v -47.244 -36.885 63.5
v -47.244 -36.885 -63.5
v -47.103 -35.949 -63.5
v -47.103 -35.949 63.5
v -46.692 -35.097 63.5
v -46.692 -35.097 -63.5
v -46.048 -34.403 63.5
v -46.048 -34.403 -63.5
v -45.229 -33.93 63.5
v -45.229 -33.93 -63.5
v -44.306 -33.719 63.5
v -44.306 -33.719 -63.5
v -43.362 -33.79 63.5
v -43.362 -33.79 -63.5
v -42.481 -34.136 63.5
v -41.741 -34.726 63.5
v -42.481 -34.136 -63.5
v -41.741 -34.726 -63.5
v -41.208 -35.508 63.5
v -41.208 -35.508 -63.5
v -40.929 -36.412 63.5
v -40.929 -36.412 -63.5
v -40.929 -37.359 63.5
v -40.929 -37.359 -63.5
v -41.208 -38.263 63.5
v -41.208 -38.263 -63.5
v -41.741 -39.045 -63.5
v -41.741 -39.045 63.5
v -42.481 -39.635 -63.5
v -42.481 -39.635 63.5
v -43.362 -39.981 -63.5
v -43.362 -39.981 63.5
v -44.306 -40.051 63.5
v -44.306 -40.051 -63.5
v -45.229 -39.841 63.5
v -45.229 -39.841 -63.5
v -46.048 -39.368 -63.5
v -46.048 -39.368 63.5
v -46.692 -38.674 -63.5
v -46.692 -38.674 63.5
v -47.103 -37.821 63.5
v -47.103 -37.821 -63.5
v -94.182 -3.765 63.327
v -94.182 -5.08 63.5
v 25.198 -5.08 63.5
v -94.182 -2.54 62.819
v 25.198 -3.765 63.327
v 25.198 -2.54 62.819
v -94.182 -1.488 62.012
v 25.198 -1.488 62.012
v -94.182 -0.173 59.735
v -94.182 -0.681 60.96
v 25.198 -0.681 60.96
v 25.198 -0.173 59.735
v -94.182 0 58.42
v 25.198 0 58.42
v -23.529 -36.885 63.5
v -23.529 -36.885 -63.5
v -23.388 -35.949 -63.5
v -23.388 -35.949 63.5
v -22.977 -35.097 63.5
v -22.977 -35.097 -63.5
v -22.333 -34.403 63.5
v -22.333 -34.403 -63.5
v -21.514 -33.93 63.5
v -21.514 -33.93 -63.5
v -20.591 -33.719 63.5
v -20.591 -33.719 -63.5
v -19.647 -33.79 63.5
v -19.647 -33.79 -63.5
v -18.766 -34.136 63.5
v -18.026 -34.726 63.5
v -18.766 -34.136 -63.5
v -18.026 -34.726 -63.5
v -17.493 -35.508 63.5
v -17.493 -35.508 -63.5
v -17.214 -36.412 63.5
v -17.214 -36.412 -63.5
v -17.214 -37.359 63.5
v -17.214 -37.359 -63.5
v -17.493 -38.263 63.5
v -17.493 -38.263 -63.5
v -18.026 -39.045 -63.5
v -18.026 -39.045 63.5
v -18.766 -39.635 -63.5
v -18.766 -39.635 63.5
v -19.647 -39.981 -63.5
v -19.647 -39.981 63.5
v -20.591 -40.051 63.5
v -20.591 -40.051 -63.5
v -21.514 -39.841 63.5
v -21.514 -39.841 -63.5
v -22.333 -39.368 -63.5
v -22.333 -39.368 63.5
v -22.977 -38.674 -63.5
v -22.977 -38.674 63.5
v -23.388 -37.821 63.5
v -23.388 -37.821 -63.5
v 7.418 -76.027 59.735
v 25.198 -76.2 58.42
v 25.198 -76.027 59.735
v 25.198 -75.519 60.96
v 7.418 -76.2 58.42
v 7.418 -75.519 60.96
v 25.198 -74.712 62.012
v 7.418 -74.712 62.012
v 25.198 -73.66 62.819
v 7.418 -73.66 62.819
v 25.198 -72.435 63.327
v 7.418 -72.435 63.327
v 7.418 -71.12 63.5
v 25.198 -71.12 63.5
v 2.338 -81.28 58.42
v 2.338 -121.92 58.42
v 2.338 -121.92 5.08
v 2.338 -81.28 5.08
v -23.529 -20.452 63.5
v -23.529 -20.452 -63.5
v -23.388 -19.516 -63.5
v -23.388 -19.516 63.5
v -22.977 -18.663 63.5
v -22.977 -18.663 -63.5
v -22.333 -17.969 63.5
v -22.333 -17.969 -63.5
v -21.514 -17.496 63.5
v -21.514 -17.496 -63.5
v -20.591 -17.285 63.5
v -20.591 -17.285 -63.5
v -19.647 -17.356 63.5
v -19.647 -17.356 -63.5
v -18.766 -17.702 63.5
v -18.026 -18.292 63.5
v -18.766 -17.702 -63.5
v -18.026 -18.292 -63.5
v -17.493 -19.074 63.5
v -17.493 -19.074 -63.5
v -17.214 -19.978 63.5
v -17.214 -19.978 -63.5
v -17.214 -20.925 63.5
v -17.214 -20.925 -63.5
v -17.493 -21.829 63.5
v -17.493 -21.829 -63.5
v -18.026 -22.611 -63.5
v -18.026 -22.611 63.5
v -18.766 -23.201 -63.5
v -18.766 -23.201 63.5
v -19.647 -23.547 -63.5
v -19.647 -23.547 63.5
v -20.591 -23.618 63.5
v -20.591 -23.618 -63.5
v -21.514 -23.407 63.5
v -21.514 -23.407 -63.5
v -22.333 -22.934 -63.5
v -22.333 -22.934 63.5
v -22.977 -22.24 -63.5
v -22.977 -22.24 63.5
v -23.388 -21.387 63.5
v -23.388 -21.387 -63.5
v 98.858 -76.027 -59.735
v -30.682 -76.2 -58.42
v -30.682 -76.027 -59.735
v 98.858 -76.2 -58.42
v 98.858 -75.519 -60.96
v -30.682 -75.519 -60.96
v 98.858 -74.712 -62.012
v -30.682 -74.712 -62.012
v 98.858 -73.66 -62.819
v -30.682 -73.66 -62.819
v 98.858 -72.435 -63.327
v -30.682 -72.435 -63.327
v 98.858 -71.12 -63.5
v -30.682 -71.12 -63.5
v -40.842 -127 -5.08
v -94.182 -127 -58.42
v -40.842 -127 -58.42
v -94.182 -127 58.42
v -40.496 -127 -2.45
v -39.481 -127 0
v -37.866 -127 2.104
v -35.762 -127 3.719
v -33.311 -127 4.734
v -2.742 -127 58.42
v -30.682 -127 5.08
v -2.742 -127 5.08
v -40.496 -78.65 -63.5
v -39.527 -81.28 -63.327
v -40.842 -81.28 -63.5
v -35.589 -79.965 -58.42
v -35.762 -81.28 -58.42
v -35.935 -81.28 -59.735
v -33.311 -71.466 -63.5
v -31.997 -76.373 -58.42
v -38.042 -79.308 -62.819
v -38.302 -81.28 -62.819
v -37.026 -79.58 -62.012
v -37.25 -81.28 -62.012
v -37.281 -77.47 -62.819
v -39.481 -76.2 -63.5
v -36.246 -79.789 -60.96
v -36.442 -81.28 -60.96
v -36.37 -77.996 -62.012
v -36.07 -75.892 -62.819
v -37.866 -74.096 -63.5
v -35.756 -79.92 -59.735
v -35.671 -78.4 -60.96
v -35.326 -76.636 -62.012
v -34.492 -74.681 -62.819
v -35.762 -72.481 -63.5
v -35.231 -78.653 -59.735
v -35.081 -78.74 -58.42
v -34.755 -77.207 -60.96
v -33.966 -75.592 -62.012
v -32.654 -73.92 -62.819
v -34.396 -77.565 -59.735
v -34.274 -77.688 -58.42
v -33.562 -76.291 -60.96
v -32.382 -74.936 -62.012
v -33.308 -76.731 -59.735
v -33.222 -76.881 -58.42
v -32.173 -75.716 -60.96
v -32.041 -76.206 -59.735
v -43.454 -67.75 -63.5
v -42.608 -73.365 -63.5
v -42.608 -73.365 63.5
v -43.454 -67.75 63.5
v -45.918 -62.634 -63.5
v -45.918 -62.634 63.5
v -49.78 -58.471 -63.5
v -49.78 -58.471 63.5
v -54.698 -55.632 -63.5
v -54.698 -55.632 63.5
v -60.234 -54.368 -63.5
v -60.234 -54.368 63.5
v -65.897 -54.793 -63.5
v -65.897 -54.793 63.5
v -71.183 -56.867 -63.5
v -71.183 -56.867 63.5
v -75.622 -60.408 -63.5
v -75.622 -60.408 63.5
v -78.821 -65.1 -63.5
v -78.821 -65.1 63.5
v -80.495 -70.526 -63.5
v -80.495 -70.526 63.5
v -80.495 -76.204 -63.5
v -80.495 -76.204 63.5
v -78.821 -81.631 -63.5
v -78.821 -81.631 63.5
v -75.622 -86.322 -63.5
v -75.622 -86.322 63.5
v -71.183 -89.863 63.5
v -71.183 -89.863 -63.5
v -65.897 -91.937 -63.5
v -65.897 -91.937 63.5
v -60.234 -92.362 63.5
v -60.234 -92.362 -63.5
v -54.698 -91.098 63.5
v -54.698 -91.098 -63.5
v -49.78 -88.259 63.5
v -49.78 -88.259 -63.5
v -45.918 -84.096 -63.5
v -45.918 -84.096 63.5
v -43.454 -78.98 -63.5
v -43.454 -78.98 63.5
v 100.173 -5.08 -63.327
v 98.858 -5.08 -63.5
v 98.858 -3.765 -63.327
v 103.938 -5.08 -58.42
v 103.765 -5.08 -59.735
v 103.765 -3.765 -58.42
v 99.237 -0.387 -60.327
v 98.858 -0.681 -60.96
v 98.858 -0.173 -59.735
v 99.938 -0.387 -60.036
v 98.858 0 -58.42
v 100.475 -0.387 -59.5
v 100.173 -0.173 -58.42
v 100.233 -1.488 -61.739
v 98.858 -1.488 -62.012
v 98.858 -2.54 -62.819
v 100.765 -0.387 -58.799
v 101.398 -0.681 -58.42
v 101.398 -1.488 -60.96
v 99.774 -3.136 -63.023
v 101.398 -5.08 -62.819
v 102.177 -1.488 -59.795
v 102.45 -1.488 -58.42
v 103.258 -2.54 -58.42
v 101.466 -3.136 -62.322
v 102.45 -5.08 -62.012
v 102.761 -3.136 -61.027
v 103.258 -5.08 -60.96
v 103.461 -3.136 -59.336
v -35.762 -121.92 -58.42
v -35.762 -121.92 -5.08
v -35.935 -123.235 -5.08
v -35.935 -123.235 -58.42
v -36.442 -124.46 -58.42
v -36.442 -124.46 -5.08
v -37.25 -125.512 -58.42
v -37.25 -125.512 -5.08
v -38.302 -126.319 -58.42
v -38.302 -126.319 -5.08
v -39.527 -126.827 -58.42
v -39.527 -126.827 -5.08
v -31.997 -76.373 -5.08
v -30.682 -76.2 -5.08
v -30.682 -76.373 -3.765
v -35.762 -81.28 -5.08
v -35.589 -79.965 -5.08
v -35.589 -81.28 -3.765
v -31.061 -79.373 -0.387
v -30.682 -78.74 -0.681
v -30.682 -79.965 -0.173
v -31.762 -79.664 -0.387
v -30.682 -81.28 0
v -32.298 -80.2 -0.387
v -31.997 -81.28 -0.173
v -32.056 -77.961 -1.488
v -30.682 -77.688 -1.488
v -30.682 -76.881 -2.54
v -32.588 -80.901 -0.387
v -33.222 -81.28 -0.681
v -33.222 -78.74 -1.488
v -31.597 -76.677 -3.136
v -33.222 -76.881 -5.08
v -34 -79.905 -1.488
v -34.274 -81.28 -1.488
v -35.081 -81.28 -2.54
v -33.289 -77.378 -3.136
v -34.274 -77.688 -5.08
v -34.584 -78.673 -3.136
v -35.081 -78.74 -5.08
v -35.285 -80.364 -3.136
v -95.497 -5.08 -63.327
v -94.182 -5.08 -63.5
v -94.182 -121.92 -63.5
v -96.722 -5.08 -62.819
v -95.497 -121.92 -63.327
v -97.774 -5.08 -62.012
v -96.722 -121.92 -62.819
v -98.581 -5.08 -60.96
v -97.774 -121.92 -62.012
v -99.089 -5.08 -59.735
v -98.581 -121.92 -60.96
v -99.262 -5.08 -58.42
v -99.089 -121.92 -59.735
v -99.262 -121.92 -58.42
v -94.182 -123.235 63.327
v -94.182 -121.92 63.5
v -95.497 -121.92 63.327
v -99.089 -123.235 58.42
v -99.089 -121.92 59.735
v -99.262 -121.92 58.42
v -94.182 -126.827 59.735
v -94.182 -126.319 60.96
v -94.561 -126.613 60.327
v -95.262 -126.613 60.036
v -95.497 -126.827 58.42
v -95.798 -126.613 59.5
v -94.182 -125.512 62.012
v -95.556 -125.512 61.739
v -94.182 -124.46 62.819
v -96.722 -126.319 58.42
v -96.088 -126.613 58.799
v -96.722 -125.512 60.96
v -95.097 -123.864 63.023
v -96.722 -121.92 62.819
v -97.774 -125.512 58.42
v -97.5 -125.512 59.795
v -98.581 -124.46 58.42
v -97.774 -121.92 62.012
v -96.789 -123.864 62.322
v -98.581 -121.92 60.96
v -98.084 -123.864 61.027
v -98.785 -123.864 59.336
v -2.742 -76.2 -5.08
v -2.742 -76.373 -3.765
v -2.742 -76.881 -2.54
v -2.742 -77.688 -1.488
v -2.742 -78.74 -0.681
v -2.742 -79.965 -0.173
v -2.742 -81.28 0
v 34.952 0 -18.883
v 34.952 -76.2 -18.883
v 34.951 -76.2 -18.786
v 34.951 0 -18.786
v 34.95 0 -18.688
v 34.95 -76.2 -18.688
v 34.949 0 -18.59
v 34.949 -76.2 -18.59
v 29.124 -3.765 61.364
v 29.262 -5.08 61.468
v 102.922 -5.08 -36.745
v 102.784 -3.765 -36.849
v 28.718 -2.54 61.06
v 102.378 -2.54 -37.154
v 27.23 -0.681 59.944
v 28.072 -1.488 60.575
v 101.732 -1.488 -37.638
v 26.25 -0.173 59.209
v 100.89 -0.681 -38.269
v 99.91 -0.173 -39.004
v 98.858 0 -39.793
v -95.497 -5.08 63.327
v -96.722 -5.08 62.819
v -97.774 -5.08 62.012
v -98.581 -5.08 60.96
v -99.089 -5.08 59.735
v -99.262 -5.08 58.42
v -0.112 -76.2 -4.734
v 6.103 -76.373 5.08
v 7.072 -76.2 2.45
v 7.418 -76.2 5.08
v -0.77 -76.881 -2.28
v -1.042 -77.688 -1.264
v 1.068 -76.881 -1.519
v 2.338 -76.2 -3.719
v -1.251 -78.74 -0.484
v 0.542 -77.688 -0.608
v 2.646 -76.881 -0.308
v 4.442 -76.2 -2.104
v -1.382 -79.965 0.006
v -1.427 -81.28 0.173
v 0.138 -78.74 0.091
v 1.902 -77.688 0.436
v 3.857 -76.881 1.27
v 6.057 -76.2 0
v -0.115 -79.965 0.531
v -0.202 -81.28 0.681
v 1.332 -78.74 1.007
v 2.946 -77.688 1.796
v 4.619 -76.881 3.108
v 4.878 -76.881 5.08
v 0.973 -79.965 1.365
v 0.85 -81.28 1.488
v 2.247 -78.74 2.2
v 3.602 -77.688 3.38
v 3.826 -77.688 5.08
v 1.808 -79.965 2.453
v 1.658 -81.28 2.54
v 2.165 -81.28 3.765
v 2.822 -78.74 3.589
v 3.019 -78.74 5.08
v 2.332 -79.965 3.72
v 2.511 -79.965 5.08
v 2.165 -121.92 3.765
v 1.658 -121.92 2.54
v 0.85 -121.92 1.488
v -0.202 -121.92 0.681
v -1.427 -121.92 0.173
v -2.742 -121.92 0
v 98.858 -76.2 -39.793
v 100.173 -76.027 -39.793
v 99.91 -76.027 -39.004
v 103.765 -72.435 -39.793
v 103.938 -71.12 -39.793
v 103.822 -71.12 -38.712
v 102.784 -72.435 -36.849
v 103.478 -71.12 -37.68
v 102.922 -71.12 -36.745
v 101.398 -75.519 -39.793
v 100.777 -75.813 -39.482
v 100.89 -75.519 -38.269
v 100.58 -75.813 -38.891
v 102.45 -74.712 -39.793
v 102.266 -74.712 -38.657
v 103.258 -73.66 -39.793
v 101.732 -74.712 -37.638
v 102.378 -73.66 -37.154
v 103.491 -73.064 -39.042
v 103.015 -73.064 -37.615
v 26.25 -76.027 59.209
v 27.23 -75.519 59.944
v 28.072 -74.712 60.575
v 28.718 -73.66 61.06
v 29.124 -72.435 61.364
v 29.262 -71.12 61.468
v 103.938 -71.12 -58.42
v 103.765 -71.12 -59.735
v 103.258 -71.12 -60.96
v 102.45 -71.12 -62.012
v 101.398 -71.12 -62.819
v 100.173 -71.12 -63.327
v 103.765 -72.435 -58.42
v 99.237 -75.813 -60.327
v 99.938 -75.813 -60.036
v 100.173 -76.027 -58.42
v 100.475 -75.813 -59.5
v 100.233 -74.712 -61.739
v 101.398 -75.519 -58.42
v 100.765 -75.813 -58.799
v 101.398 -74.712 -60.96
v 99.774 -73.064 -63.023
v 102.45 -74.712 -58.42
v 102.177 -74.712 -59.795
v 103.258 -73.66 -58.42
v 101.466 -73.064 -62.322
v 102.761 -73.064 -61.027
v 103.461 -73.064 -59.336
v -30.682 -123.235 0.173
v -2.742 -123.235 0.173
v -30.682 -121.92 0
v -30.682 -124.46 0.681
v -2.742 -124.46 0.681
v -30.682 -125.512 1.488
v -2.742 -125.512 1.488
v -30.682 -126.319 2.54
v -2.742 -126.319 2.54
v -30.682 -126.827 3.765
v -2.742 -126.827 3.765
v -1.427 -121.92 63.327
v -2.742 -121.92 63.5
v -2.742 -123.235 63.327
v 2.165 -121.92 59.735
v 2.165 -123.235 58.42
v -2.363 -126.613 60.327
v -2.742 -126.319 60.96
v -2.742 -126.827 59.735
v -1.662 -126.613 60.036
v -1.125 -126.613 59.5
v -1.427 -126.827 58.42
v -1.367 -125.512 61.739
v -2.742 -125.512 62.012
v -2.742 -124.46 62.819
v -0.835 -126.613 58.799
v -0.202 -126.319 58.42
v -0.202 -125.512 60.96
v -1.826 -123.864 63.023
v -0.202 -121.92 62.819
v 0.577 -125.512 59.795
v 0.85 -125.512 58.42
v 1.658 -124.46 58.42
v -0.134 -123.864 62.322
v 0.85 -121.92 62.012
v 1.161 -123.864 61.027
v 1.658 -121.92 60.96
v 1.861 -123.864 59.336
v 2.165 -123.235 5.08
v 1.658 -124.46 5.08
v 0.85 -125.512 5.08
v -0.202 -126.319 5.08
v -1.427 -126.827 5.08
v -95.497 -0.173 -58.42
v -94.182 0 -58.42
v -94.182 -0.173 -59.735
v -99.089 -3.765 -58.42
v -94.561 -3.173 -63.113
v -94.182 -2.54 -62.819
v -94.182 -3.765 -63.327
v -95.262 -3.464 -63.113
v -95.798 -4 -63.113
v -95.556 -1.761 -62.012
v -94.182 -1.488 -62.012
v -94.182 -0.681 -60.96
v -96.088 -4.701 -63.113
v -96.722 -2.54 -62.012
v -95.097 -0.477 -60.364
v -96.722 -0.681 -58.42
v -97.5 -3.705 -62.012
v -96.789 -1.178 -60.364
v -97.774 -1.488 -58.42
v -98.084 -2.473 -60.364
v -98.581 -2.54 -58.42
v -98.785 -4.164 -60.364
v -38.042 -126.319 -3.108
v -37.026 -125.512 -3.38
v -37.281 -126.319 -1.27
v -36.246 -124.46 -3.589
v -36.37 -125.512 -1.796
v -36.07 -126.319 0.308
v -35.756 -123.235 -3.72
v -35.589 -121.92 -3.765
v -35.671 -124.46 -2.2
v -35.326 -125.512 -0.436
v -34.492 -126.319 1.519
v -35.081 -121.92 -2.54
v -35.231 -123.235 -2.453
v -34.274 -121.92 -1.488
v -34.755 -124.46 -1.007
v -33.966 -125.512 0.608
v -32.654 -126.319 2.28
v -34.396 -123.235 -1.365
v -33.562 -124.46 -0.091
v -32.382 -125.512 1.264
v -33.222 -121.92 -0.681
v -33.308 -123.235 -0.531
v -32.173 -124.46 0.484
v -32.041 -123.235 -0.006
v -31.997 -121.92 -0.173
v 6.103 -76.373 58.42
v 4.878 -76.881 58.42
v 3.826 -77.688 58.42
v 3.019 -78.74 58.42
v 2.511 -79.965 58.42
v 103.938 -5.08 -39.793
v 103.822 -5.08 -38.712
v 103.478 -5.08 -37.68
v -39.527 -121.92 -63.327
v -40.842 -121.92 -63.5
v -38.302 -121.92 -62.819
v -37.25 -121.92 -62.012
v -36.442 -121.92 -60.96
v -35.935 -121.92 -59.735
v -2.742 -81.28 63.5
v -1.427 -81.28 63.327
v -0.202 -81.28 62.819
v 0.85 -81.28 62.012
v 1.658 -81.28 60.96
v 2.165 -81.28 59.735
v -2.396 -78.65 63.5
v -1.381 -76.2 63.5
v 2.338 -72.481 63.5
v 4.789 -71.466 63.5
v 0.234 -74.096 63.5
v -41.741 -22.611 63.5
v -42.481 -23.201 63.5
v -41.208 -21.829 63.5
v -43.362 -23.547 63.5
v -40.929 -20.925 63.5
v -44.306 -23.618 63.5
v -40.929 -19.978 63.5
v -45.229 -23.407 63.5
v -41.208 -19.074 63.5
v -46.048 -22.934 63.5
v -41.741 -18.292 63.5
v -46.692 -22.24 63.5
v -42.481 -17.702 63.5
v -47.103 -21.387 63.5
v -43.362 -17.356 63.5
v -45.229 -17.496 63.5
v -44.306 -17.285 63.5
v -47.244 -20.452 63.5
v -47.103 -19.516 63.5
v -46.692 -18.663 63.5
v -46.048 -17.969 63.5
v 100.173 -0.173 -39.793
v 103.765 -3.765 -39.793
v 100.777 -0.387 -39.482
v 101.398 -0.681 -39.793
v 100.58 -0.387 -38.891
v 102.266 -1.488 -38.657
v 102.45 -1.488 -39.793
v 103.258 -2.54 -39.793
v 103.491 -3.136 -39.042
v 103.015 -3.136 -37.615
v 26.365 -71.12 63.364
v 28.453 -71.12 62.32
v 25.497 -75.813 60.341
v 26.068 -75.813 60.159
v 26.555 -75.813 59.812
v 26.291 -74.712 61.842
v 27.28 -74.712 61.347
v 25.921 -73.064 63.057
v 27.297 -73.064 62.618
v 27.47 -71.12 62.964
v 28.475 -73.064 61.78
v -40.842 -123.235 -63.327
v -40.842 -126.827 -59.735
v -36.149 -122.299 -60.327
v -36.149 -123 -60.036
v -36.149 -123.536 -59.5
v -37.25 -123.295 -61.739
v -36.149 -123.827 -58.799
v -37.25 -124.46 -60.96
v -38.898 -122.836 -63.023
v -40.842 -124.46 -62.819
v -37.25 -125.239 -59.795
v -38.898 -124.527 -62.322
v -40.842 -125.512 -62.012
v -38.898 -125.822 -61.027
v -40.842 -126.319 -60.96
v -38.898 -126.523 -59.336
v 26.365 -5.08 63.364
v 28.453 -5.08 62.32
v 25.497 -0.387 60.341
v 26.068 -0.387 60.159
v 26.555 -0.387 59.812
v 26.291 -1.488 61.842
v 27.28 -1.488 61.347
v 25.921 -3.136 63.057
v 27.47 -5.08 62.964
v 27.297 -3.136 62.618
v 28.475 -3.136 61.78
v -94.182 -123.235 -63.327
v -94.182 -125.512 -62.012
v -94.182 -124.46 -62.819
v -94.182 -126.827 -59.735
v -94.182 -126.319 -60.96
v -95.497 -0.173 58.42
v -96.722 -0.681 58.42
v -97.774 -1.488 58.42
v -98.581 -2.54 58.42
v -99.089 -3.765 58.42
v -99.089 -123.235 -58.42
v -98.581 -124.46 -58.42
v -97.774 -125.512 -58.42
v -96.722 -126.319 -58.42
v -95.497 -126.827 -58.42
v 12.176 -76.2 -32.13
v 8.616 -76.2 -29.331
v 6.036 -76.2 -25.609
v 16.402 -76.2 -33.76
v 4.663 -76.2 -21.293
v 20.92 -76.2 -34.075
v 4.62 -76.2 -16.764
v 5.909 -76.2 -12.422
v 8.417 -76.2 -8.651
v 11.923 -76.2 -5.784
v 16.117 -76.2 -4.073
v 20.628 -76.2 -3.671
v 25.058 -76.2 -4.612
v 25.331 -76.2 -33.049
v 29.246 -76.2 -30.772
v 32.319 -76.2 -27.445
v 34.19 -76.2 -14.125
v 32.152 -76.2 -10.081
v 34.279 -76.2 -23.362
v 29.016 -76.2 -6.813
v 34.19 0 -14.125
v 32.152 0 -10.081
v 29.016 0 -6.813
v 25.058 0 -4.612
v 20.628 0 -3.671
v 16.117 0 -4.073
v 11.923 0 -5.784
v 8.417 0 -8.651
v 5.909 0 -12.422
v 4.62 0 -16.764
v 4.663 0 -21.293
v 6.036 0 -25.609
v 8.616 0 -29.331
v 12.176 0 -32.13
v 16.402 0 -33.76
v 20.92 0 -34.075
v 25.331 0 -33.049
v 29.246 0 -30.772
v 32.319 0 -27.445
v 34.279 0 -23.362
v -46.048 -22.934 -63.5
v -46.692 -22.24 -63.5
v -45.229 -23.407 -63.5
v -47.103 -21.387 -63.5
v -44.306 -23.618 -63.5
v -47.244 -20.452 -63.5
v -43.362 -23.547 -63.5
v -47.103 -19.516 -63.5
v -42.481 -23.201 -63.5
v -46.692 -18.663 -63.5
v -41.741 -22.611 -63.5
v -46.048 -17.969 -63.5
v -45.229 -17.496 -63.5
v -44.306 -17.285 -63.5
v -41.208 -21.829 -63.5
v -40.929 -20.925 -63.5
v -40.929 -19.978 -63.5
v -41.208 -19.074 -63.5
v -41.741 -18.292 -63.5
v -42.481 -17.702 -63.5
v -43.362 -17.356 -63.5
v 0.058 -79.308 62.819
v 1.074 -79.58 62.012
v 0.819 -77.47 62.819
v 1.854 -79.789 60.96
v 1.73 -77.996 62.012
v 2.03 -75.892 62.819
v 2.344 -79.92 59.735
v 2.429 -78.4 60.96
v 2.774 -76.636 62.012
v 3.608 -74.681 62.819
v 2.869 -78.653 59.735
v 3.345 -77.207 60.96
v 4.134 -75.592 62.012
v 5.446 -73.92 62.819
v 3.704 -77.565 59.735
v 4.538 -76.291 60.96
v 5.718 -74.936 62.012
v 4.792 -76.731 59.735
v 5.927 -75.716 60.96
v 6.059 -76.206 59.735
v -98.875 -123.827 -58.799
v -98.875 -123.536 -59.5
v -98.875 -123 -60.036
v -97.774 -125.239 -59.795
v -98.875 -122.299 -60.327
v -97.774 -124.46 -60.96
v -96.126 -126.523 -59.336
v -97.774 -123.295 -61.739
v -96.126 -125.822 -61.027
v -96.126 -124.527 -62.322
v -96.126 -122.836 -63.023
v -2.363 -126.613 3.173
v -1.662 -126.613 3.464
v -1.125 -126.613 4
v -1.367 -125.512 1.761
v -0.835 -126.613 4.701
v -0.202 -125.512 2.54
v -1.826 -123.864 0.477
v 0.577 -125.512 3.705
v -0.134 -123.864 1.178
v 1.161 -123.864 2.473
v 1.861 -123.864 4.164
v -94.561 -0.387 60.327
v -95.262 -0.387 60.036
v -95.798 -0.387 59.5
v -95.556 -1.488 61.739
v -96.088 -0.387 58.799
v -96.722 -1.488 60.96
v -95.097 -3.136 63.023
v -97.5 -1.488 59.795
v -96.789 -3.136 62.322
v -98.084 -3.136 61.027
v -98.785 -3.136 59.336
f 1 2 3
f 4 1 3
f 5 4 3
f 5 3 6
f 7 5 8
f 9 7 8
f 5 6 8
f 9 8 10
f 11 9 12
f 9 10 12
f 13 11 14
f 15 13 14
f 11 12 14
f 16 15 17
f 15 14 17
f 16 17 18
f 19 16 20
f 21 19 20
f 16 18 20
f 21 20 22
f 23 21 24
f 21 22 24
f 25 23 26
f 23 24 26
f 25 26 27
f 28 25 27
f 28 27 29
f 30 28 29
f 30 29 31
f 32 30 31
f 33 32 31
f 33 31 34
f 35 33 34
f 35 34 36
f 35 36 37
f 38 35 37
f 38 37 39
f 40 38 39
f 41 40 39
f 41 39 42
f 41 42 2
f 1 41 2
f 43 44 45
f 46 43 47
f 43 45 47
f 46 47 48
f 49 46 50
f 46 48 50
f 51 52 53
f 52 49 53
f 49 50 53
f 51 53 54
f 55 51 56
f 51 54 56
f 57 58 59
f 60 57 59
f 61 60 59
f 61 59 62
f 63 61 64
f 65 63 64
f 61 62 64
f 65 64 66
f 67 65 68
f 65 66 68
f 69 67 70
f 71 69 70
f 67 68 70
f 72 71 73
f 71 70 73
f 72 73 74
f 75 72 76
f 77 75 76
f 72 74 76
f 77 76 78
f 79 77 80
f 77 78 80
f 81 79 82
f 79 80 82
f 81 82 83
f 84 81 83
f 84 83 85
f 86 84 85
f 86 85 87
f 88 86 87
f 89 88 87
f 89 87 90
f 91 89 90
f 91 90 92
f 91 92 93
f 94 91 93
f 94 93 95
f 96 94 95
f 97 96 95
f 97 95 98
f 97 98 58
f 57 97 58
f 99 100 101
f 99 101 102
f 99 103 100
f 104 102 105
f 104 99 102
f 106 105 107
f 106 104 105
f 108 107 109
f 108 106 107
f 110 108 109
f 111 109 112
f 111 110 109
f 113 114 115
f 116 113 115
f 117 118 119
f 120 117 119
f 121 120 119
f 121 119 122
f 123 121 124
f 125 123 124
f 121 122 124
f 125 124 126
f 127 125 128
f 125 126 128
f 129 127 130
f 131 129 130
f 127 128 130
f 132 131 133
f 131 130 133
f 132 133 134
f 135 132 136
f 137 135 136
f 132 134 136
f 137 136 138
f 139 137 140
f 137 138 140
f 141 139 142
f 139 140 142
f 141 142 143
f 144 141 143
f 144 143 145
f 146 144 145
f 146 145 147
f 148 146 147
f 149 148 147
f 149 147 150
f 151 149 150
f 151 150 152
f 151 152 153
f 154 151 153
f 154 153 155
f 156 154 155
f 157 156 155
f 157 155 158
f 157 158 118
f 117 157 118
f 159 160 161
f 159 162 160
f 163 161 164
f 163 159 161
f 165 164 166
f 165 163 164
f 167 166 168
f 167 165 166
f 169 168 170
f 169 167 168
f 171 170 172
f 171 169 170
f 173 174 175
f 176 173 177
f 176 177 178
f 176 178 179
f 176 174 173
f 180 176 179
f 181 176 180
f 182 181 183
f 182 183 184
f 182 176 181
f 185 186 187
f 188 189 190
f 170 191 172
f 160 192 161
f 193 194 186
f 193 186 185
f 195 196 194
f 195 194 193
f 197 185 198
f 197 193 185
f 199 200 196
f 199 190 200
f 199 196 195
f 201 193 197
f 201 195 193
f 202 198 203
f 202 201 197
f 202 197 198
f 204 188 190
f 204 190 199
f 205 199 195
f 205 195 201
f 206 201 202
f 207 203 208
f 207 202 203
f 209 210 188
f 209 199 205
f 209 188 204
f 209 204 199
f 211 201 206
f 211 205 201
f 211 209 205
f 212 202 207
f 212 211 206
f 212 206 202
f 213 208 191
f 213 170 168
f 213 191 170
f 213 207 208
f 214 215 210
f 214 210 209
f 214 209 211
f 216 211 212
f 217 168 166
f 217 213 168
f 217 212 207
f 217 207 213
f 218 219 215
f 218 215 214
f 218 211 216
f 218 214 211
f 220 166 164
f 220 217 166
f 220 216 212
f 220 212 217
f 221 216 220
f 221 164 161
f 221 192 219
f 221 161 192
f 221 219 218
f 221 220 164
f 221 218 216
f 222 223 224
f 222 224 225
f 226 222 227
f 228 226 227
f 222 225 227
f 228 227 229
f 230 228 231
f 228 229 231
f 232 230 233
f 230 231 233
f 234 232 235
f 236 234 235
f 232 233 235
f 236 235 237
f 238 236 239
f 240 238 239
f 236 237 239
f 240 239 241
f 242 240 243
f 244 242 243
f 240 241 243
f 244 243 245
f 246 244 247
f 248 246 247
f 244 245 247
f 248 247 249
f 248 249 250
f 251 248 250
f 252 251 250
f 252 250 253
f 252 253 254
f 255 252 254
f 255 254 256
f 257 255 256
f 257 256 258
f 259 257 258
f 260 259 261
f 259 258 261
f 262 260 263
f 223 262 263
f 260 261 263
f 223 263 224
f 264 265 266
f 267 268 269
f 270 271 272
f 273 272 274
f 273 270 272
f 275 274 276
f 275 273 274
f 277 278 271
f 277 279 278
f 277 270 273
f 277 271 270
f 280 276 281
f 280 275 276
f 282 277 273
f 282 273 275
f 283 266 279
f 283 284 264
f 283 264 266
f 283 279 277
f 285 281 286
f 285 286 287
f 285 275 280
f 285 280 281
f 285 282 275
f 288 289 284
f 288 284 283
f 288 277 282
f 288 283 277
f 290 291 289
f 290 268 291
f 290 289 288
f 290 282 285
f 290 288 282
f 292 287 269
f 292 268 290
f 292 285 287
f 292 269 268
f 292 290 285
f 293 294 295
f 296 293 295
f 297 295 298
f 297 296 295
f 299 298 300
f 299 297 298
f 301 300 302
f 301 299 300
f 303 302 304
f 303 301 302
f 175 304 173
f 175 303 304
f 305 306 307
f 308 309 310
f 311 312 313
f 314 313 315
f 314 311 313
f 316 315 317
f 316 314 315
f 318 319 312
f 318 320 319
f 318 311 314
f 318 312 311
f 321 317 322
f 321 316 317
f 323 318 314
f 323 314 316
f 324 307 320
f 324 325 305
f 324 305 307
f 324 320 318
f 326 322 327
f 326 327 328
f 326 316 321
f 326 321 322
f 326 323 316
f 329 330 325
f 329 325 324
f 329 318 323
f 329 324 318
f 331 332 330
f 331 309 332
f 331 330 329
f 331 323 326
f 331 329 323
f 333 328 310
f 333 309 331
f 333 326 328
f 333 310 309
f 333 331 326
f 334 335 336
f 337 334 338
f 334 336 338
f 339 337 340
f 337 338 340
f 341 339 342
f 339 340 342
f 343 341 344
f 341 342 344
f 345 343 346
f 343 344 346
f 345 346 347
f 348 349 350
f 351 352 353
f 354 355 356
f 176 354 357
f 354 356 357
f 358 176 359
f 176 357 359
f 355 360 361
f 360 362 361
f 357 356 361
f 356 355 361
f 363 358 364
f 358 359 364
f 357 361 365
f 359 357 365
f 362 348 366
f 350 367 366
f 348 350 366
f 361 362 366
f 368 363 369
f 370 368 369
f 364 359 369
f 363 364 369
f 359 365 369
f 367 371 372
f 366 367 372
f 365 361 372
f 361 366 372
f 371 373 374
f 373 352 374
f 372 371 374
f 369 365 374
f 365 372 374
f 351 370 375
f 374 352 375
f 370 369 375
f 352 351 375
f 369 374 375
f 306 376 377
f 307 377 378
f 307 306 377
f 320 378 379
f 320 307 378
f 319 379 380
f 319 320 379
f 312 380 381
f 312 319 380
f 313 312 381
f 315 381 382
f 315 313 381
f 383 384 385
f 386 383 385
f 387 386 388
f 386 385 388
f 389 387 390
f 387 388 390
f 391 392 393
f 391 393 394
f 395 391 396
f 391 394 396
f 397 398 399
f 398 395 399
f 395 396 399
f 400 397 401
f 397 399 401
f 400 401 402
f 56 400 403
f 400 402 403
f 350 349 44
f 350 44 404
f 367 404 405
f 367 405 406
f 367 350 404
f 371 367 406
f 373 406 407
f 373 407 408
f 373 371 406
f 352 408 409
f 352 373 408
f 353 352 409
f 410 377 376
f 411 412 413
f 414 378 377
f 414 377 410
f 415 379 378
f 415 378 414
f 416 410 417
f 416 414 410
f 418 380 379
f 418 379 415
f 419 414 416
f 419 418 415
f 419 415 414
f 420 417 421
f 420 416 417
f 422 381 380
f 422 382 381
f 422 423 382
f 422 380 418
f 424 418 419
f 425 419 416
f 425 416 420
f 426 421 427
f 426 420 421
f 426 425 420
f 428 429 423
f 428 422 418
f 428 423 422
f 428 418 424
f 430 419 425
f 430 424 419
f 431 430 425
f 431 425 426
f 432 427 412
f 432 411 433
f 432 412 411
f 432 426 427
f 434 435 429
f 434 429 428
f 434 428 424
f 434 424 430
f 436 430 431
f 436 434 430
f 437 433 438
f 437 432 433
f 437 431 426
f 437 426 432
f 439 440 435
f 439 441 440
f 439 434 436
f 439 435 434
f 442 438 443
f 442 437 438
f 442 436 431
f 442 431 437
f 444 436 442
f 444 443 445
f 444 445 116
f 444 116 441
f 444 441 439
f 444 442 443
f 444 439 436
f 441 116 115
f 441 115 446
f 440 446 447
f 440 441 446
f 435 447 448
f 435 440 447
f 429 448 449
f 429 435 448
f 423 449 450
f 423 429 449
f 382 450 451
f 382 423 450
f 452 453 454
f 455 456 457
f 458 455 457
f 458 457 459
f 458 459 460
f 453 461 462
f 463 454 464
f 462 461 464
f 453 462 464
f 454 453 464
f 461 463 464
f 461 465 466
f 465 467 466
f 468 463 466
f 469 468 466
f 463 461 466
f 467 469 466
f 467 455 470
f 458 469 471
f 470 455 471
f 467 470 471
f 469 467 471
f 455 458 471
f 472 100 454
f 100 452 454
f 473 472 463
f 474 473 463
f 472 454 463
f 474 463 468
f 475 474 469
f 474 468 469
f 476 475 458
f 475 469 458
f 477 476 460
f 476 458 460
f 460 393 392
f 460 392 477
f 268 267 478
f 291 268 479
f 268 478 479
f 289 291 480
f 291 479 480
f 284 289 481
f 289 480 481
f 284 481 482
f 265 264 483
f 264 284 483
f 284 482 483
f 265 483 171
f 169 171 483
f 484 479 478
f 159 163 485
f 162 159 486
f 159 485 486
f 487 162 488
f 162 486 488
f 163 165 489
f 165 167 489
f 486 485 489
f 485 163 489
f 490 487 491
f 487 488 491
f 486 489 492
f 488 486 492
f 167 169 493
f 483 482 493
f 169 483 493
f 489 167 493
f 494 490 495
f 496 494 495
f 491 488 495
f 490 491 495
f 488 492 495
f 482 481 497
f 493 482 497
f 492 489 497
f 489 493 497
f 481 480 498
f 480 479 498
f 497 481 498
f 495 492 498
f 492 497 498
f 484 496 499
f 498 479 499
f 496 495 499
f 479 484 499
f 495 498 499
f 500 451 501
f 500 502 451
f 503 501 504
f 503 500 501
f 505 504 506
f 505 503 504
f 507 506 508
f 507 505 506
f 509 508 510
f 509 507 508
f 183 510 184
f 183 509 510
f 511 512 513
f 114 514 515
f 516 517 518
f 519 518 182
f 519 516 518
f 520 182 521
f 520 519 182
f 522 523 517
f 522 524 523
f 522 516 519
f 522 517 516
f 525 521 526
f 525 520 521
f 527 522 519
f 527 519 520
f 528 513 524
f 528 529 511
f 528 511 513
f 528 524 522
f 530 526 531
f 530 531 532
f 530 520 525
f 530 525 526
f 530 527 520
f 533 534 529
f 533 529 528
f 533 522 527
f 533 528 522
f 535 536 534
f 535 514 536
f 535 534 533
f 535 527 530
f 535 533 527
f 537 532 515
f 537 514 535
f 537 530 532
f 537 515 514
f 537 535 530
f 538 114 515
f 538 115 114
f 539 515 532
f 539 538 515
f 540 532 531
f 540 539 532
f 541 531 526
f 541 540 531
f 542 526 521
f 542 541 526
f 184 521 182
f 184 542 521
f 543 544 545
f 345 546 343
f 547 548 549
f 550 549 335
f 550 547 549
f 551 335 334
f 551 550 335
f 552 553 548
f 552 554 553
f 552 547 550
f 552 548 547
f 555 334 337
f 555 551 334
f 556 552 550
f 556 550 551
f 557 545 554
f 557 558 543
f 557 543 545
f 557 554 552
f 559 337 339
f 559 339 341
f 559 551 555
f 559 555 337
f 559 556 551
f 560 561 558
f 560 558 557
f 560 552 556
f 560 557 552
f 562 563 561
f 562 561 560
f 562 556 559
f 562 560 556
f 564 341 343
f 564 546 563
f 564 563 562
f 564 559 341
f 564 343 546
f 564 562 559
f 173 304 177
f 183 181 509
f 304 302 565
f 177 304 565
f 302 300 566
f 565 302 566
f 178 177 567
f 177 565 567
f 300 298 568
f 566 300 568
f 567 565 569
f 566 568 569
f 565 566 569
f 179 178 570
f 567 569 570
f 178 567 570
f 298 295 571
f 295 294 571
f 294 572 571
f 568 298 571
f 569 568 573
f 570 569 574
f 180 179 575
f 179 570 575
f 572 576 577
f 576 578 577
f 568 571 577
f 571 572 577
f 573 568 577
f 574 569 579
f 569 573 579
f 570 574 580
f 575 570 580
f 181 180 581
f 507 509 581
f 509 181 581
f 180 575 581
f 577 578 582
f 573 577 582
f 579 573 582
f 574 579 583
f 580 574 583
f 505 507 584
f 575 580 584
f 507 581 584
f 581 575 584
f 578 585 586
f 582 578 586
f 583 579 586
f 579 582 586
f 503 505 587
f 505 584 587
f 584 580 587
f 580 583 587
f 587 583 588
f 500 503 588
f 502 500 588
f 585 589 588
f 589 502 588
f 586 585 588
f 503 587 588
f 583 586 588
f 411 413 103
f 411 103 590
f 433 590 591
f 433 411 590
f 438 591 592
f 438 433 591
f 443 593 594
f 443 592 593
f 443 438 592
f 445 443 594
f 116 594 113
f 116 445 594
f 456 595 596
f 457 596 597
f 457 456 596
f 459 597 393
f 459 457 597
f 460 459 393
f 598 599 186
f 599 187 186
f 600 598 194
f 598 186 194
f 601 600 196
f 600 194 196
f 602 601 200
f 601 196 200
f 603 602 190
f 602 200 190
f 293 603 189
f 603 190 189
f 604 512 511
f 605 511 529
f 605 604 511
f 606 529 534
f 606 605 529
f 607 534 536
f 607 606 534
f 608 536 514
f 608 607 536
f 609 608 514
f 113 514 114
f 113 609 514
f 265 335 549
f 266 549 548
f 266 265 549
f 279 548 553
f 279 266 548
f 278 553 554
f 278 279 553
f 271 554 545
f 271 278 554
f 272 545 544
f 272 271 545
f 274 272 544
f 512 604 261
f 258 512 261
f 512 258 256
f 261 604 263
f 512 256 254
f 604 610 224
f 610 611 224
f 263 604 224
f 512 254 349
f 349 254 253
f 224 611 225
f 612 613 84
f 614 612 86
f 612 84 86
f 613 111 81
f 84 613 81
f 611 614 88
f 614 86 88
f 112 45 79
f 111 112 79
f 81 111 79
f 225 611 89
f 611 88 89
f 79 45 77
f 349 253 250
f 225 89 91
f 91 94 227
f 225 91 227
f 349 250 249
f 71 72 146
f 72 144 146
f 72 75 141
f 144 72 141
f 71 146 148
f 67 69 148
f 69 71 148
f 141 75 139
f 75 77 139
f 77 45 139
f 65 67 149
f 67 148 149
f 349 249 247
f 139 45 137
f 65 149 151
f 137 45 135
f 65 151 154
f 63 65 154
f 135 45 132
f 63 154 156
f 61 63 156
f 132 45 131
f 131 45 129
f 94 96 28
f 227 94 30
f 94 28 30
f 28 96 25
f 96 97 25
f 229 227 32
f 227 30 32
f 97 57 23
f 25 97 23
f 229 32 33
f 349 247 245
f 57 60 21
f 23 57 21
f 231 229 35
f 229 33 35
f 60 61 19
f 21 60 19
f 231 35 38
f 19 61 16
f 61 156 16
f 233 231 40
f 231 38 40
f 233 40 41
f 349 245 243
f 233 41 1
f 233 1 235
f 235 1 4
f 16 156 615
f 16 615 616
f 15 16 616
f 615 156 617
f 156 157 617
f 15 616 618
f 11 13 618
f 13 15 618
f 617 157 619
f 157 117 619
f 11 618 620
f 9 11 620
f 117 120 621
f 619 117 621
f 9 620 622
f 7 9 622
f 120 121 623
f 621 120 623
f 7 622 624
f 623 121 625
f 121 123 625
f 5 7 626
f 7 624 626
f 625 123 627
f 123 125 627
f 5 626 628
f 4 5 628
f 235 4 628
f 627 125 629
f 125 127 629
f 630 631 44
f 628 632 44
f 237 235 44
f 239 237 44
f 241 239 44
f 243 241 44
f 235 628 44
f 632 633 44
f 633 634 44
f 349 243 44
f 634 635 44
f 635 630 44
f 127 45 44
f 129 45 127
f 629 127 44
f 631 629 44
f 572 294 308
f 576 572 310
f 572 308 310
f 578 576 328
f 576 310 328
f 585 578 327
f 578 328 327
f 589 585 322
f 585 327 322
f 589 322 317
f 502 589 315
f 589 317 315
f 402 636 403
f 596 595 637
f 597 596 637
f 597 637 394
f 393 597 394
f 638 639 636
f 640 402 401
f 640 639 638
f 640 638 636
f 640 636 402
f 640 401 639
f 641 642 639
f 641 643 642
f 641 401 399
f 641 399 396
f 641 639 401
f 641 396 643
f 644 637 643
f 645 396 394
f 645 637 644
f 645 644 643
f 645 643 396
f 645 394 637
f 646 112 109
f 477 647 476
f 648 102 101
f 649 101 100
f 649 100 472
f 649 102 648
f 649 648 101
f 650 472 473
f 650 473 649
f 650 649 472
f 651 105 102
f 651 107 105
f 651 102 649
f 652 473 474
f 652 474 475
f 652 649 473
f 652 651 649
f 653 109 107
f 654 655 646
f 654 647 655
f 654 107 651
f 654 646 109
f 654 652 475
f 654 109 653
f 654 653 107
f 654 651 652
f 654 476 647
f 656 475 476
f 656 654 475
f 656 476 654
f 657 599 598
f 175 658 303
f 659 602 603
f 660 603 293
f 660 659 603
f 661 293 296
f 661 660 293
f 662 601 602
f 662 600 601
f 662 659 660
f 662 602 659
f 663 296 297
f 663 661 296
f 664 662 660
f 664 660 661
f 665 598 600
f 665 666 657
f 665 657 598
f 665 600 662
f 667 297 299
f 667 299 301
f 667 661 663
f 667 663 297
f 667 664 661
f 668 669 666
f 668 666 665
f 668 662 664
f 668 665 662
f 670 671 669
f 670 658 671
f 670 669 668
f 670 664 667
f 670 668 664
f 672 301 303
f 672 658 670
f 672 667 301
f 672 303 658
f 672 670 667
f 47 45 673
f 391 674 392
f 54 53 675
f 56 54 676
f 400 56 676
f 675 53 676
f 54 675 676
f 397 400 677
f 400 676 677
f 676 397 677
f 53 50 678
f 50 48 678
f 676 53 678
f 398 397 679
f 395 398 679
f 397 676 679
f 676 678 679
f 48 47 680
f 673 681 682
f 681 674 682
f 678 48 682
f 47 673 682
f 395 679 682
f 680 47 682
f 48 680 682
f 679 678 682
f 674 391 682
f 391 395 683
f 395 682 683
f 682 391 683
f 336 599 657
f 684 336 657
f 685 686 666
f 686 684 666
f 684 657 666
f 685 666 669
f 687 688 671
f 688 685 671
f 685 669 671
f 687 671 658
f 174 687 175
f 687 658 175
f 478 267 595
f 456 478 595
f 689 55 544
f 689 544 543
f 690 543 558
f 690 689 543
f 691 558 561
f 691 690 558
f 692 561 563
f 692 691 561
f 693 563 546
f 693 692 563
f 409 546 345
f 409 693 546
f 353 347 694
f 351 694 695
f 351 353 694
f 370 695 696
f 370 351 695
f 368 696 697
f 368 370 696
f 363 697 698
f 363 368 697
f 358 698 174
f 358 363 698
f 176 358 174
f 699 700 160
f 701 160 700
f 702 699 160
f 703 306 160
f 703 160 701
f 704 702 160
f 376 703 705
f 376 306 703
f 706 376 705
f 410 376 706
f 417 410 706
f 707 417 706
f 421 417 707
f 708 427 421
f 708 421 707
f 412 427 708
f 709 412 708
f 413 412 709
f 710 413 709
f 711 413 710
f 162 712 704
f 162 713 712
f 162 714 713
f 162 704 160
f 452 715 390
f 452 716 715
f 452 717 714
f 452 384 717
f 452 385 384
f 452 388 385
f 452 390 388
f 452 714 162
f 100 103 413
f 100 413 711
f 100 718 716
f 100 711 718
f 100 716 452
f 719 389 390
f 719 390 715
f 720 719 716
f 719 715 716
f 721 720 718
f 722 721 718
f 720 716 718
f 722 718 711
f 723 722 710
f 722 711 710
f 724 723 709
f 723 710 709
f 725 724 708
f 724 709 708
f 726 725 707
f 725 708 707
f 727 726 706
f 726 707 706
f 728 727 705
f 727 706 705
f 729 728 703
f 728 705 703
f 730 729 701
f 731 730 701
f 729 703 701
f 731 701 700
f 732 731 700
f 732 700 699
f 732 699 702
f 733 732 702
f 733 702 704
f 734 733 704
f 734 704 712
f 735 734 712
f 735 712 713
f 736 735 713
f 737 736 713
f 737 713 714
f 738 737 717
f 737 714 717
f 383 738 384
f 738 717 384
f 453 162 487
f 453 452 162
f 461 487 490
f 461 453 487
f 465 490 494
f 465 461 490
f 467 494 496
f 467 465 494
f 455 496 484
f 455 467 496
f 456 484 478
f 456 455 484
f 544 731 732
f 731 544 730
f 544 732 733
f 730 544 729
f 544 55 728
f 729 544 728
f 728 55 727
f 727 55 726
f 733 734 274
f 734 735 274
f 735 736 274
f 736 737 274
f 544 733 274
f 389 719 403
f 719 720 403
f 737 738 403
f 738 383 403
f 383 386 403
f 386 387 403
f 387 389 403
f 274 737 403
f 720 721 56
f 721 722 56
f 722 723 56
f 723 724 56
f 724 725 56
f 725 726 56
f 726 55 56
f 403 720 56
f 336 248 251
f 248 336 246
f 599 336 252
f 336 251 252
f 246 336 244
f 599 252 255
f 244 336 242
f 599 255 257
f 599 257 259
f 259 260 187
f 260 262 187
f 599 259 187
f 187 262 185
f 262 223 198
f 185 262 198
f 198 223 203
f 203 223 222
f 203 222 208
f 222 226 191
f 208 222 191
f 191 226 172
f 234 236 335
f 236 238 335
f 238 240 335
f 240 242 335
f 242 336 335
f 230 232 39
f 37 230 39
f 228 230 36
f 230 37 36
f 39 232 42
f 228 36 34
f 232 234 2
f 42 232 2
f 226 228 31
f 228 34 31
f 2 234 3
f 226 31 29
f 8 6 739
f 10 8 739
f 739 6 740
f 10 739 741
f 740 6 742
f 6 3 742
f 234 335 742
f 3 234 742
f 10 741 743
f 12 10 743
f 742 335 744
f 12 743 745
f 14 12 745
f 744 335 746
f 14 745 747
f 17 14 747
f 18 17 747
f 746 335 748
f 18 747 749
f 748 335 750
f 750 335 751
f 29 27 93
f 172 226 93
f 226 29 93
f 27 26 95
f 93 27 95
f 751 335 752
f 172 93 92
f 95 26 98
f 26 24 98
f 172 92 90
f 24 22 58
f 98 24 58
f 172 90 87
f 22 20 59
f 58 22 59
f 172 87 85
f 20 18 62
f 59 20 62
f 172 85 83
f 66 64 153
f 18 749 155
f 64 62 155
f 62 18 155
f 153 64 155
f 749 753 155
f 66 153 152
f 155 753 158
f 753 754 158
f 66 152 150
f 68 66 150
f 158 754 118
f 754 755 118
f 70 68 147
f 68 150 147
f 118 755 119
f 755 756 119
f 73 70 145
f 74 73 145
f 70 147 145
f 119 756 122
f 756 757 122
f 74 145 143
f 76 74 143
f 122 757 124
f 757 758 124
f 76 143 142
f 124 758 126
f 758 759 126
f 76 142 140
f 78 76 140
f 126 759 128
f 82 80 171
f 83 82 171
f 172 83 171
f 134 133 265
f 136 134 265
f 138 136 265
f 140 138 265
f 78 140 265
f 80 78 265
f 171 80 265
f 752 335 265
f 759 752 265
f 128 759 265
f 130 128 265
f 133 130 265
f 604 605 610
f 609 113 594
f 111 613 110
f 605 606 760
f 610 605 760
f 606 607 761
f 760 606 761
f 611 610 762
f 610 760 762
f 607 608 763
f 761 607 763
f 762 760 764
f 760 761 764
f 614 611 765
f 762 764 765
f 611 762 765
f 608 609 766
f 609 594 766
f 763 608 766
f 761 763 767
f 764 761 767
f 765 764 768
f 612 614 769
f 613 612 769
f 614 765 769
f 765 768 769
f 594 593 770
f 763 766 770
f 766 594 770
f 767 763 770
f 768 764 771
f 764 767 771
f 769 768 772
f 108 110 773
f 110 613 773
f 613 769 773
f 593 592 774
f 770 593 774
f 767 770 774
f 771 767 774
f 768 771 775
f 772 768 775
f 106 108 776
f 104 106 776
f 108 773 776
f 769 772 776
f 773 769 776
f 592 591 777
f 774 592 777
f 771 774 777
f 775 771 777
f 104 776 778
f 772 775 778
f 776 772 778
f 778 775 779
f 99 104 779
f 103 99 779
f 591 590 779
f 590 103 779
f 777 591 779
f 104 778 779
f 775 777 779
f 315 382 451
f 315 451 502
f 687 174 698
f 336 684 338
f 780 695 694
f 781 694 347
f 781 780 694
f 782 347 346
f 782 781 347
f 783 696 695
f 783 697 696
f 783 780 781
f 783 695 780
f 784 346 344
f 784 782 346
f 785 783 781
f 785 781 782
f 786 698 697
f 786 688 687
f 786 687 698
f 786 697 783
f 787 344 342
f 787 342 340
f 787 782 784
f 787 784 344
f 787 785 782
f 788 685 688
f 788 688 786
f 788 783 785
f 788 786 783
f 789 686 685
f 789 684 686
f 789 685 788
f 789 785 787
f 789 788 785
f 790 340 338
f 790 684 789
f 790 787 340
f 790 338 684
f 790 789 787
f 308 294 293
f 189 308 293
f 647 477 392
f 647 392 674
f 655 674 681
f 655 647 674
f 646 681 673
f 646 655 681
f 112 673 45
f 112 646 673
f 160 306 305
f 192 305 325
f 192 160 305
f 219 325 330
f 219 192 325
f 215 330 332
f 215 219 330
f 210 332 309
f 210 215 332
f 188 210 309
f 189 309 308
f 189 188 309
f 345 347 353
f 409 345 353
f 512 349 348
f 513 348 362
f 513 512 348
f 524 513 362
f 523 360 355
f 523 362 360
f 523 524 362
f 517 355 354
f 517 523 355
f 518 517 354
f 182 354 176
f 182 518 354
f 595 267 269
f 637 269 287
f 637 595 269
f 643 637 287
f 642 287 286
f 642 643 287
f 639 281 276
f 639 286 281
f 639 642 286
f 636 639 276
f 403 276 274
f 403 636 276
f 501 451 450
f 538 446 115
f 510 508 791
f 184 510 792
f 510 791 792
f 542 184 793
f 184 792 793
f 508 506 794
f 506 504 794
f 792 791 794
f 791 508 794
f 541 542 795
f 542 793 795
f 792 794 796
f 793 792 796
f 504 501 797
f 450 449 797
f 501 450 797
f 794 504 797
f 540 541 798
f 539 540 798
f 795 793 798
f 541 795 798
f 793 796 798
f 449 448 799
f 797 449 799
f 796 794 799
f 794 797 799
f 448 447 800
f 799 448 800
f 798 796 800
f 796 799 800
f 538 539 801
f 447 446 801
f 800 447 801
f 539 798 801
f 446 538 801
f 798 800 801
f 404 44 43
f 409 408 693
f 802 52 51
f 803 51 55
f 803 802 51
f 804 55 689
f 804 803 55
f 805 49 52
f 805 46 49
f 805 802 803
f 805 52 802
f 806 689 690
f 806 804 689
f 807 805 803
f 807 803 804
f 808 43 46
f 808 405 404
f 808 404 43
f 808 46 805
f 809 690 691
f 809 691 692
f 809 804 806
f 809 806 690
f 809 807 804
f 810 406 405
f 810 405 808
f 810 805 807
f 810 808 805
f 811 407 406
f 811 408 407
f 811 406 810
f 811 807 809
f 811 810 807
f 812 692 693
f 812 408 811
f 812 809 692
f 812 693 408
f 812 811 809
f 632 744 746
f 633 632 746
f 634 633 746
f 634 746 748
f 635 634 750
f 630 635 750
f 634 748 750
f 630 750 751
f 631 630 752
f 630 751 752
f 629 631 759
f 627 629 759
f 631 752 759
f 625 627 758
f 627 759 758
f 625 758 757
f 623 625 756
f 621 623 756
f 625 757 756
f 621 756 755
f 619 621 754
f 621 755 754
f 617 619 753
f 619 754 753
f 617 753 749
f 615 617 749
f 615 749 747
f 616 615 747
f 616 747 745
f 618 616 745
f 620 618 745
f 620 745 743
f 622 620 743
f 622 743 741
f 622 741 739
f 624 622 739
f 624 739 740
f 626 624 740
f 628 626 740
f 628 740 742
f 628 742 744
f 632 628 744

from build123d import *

# Parameters (mm, degrees)
F0_W      = 203.2
F0_H      = 127
F1_DEPTH  = 127
F3_DEPTH  = 101.6
F4_DEPTH  = 50.8
F5_SIZE2  = 101.6
F5_SIZE   = 76.2
F6_R      = 5.08
F8_DEPTH  = 76.2
F9_R      = 19.05
F10_DEPTH = 127
F12_D     = 6.35


with BuildPart() as f1:
    # F0 (on Front) → F1 (new body)
    with BuildSketch(Plane.XZ):
        with Locations((2.3381854308, 0)):
            Rectangle(F0_W, F0_H)
    extrude(amount=F1_DEPTH)

    # F2 (on face) → F3 (cut)
    with BuildSketch(Plane.XZ.offset(127)):
        Polygon((-35.7618145692, 0), (-35.7618145692, -63.5), (103.9381854308, -63.5), (103.9381854308, 63.5), (2.3381854308, 63.5), (2.3381854308, 0), align=None)
    extrude(amount=-F3_DEPTH, mode=Mode.SUBTRACT)

    # F4 (add): a face of the model
    f4_faces = [f1.faces().sort_by_distance(p)[0] for p in [
        (42.1092380623, -25.4, -5.0131578947),
    ]]
    extrude(f4_faces, amount=F4_DEPTH)

    # F5
    f5_edges = [f1.edges().sort_by_distance(p)[0] for p in [
        (103.938185, -38.1, 63.5),
    ]]
    f5_side = f1.faces().sort_by_distance((-10.361815, -53.975, 63.5))[0]
    chamfer(f5_edges, length=F5_SIZE, length2=F5_SIZE2, reference=f5_side)

    # F6
    f6_edges = [f1.edges().sort_by_distance(p)[0] for p in [
        (-67.511815, -127, -63.5),
        (2.338185, -101.6, 0),
        (-35.761815, -101.6, -63.5),
        (-99.261815, -63.5, 63.5),
        (2.338185, -101.6, 63.5),
        (15.038185, -76.2, 63.5),
        (65.838185, -76.2, 12.7),
        (-16.711815, -127, 0),
        (103.938185, -38.1, -63.5),
        (-35.761815, 0, 63.5),
        (65.838185, 0, 12.7),
        (34.088185, -76.2, -63.5),
        (-48.461815, -127, 63.5),
        (27.738185, -38.1, 63.5),
        (103.938185, -38.1, -38.1),
        (-35.761815, -76.2, -31.75),
        (-99.261815, 0, 0),
        (-16.711815, -76.2, 0),
        (2.338185, 0, -63.5),
        (-99.261815, -127, 0),
        (-99.261815, -63.5, -63.5),
        (-35.761815, -101.6, 0),
        (2.338185, -76.2, 31.75),
        (2.338185, -127, 31.75),
        (-35.761815, -127, -31.75),
        (103.938185, 0, -50.8),
        (103.938185, -76.2, -50.8),
    ]]
    fillet(f6_edges, radius=F6_R)

    # F7 (on face) → F8 (cut, through all)
    with BuildSketch(Plane.XZ.offset(76.2)):
        with BuildLine():
            Line((19.7116794232, -18.8833934691), (34.9488621098, -18.5903682534))
            ThreePointArc((34.9488621098, -18.5903682534), (8.7301641023, -8.3162783823), (20.0047046389, -34.1205761556))
            Line((20.0047046389, -34.1205761556), (19.7116794232, -18.8833934691))
        make_face()
        with BuildLine():
            ThreePointArc((20.0047046389, -34.1205761556), (30.5910935684, -29.5555979207), (34.9516794232, -18.8833934691))
            ThreePointArc((34.9516794232, -18.8833934691), (34.9509750786, -18.7368740896), (34.9488621098, -18.5903682534))
            Line((34.9488621098, -18.5903682534), (19.7116794232, -18.8833934691))
            Line((19.7116794232, -18.8833934691), (20.0047046389, -34.1205761556))
        make_face()
    extrude(amount=-F8_DEPTH, mode=Mode.SUBTRACT)

    # F9 (on face) → F10 (cut, through all)
    with BuildSketch(Plane.XY.offset(63.5)):
        with Locations((-61.6576299071, -73.365047574)):
            Circle(F9_R)
    extrude(amount=-F10_DEPTH, mode=Mode.SUBTRACT)

    # F12 (through all)
    with Locations(Plane.XY.offset(63.5)):
        with Locations((-44.0687574446, -20.4515326768), (-44.0687574446, -36.8853211403), (-20.3539002687, -20.4515326768), (-20.3539002687, -36.8853211403)):
            Hole(F12_D / 2)


solid = f1.part
